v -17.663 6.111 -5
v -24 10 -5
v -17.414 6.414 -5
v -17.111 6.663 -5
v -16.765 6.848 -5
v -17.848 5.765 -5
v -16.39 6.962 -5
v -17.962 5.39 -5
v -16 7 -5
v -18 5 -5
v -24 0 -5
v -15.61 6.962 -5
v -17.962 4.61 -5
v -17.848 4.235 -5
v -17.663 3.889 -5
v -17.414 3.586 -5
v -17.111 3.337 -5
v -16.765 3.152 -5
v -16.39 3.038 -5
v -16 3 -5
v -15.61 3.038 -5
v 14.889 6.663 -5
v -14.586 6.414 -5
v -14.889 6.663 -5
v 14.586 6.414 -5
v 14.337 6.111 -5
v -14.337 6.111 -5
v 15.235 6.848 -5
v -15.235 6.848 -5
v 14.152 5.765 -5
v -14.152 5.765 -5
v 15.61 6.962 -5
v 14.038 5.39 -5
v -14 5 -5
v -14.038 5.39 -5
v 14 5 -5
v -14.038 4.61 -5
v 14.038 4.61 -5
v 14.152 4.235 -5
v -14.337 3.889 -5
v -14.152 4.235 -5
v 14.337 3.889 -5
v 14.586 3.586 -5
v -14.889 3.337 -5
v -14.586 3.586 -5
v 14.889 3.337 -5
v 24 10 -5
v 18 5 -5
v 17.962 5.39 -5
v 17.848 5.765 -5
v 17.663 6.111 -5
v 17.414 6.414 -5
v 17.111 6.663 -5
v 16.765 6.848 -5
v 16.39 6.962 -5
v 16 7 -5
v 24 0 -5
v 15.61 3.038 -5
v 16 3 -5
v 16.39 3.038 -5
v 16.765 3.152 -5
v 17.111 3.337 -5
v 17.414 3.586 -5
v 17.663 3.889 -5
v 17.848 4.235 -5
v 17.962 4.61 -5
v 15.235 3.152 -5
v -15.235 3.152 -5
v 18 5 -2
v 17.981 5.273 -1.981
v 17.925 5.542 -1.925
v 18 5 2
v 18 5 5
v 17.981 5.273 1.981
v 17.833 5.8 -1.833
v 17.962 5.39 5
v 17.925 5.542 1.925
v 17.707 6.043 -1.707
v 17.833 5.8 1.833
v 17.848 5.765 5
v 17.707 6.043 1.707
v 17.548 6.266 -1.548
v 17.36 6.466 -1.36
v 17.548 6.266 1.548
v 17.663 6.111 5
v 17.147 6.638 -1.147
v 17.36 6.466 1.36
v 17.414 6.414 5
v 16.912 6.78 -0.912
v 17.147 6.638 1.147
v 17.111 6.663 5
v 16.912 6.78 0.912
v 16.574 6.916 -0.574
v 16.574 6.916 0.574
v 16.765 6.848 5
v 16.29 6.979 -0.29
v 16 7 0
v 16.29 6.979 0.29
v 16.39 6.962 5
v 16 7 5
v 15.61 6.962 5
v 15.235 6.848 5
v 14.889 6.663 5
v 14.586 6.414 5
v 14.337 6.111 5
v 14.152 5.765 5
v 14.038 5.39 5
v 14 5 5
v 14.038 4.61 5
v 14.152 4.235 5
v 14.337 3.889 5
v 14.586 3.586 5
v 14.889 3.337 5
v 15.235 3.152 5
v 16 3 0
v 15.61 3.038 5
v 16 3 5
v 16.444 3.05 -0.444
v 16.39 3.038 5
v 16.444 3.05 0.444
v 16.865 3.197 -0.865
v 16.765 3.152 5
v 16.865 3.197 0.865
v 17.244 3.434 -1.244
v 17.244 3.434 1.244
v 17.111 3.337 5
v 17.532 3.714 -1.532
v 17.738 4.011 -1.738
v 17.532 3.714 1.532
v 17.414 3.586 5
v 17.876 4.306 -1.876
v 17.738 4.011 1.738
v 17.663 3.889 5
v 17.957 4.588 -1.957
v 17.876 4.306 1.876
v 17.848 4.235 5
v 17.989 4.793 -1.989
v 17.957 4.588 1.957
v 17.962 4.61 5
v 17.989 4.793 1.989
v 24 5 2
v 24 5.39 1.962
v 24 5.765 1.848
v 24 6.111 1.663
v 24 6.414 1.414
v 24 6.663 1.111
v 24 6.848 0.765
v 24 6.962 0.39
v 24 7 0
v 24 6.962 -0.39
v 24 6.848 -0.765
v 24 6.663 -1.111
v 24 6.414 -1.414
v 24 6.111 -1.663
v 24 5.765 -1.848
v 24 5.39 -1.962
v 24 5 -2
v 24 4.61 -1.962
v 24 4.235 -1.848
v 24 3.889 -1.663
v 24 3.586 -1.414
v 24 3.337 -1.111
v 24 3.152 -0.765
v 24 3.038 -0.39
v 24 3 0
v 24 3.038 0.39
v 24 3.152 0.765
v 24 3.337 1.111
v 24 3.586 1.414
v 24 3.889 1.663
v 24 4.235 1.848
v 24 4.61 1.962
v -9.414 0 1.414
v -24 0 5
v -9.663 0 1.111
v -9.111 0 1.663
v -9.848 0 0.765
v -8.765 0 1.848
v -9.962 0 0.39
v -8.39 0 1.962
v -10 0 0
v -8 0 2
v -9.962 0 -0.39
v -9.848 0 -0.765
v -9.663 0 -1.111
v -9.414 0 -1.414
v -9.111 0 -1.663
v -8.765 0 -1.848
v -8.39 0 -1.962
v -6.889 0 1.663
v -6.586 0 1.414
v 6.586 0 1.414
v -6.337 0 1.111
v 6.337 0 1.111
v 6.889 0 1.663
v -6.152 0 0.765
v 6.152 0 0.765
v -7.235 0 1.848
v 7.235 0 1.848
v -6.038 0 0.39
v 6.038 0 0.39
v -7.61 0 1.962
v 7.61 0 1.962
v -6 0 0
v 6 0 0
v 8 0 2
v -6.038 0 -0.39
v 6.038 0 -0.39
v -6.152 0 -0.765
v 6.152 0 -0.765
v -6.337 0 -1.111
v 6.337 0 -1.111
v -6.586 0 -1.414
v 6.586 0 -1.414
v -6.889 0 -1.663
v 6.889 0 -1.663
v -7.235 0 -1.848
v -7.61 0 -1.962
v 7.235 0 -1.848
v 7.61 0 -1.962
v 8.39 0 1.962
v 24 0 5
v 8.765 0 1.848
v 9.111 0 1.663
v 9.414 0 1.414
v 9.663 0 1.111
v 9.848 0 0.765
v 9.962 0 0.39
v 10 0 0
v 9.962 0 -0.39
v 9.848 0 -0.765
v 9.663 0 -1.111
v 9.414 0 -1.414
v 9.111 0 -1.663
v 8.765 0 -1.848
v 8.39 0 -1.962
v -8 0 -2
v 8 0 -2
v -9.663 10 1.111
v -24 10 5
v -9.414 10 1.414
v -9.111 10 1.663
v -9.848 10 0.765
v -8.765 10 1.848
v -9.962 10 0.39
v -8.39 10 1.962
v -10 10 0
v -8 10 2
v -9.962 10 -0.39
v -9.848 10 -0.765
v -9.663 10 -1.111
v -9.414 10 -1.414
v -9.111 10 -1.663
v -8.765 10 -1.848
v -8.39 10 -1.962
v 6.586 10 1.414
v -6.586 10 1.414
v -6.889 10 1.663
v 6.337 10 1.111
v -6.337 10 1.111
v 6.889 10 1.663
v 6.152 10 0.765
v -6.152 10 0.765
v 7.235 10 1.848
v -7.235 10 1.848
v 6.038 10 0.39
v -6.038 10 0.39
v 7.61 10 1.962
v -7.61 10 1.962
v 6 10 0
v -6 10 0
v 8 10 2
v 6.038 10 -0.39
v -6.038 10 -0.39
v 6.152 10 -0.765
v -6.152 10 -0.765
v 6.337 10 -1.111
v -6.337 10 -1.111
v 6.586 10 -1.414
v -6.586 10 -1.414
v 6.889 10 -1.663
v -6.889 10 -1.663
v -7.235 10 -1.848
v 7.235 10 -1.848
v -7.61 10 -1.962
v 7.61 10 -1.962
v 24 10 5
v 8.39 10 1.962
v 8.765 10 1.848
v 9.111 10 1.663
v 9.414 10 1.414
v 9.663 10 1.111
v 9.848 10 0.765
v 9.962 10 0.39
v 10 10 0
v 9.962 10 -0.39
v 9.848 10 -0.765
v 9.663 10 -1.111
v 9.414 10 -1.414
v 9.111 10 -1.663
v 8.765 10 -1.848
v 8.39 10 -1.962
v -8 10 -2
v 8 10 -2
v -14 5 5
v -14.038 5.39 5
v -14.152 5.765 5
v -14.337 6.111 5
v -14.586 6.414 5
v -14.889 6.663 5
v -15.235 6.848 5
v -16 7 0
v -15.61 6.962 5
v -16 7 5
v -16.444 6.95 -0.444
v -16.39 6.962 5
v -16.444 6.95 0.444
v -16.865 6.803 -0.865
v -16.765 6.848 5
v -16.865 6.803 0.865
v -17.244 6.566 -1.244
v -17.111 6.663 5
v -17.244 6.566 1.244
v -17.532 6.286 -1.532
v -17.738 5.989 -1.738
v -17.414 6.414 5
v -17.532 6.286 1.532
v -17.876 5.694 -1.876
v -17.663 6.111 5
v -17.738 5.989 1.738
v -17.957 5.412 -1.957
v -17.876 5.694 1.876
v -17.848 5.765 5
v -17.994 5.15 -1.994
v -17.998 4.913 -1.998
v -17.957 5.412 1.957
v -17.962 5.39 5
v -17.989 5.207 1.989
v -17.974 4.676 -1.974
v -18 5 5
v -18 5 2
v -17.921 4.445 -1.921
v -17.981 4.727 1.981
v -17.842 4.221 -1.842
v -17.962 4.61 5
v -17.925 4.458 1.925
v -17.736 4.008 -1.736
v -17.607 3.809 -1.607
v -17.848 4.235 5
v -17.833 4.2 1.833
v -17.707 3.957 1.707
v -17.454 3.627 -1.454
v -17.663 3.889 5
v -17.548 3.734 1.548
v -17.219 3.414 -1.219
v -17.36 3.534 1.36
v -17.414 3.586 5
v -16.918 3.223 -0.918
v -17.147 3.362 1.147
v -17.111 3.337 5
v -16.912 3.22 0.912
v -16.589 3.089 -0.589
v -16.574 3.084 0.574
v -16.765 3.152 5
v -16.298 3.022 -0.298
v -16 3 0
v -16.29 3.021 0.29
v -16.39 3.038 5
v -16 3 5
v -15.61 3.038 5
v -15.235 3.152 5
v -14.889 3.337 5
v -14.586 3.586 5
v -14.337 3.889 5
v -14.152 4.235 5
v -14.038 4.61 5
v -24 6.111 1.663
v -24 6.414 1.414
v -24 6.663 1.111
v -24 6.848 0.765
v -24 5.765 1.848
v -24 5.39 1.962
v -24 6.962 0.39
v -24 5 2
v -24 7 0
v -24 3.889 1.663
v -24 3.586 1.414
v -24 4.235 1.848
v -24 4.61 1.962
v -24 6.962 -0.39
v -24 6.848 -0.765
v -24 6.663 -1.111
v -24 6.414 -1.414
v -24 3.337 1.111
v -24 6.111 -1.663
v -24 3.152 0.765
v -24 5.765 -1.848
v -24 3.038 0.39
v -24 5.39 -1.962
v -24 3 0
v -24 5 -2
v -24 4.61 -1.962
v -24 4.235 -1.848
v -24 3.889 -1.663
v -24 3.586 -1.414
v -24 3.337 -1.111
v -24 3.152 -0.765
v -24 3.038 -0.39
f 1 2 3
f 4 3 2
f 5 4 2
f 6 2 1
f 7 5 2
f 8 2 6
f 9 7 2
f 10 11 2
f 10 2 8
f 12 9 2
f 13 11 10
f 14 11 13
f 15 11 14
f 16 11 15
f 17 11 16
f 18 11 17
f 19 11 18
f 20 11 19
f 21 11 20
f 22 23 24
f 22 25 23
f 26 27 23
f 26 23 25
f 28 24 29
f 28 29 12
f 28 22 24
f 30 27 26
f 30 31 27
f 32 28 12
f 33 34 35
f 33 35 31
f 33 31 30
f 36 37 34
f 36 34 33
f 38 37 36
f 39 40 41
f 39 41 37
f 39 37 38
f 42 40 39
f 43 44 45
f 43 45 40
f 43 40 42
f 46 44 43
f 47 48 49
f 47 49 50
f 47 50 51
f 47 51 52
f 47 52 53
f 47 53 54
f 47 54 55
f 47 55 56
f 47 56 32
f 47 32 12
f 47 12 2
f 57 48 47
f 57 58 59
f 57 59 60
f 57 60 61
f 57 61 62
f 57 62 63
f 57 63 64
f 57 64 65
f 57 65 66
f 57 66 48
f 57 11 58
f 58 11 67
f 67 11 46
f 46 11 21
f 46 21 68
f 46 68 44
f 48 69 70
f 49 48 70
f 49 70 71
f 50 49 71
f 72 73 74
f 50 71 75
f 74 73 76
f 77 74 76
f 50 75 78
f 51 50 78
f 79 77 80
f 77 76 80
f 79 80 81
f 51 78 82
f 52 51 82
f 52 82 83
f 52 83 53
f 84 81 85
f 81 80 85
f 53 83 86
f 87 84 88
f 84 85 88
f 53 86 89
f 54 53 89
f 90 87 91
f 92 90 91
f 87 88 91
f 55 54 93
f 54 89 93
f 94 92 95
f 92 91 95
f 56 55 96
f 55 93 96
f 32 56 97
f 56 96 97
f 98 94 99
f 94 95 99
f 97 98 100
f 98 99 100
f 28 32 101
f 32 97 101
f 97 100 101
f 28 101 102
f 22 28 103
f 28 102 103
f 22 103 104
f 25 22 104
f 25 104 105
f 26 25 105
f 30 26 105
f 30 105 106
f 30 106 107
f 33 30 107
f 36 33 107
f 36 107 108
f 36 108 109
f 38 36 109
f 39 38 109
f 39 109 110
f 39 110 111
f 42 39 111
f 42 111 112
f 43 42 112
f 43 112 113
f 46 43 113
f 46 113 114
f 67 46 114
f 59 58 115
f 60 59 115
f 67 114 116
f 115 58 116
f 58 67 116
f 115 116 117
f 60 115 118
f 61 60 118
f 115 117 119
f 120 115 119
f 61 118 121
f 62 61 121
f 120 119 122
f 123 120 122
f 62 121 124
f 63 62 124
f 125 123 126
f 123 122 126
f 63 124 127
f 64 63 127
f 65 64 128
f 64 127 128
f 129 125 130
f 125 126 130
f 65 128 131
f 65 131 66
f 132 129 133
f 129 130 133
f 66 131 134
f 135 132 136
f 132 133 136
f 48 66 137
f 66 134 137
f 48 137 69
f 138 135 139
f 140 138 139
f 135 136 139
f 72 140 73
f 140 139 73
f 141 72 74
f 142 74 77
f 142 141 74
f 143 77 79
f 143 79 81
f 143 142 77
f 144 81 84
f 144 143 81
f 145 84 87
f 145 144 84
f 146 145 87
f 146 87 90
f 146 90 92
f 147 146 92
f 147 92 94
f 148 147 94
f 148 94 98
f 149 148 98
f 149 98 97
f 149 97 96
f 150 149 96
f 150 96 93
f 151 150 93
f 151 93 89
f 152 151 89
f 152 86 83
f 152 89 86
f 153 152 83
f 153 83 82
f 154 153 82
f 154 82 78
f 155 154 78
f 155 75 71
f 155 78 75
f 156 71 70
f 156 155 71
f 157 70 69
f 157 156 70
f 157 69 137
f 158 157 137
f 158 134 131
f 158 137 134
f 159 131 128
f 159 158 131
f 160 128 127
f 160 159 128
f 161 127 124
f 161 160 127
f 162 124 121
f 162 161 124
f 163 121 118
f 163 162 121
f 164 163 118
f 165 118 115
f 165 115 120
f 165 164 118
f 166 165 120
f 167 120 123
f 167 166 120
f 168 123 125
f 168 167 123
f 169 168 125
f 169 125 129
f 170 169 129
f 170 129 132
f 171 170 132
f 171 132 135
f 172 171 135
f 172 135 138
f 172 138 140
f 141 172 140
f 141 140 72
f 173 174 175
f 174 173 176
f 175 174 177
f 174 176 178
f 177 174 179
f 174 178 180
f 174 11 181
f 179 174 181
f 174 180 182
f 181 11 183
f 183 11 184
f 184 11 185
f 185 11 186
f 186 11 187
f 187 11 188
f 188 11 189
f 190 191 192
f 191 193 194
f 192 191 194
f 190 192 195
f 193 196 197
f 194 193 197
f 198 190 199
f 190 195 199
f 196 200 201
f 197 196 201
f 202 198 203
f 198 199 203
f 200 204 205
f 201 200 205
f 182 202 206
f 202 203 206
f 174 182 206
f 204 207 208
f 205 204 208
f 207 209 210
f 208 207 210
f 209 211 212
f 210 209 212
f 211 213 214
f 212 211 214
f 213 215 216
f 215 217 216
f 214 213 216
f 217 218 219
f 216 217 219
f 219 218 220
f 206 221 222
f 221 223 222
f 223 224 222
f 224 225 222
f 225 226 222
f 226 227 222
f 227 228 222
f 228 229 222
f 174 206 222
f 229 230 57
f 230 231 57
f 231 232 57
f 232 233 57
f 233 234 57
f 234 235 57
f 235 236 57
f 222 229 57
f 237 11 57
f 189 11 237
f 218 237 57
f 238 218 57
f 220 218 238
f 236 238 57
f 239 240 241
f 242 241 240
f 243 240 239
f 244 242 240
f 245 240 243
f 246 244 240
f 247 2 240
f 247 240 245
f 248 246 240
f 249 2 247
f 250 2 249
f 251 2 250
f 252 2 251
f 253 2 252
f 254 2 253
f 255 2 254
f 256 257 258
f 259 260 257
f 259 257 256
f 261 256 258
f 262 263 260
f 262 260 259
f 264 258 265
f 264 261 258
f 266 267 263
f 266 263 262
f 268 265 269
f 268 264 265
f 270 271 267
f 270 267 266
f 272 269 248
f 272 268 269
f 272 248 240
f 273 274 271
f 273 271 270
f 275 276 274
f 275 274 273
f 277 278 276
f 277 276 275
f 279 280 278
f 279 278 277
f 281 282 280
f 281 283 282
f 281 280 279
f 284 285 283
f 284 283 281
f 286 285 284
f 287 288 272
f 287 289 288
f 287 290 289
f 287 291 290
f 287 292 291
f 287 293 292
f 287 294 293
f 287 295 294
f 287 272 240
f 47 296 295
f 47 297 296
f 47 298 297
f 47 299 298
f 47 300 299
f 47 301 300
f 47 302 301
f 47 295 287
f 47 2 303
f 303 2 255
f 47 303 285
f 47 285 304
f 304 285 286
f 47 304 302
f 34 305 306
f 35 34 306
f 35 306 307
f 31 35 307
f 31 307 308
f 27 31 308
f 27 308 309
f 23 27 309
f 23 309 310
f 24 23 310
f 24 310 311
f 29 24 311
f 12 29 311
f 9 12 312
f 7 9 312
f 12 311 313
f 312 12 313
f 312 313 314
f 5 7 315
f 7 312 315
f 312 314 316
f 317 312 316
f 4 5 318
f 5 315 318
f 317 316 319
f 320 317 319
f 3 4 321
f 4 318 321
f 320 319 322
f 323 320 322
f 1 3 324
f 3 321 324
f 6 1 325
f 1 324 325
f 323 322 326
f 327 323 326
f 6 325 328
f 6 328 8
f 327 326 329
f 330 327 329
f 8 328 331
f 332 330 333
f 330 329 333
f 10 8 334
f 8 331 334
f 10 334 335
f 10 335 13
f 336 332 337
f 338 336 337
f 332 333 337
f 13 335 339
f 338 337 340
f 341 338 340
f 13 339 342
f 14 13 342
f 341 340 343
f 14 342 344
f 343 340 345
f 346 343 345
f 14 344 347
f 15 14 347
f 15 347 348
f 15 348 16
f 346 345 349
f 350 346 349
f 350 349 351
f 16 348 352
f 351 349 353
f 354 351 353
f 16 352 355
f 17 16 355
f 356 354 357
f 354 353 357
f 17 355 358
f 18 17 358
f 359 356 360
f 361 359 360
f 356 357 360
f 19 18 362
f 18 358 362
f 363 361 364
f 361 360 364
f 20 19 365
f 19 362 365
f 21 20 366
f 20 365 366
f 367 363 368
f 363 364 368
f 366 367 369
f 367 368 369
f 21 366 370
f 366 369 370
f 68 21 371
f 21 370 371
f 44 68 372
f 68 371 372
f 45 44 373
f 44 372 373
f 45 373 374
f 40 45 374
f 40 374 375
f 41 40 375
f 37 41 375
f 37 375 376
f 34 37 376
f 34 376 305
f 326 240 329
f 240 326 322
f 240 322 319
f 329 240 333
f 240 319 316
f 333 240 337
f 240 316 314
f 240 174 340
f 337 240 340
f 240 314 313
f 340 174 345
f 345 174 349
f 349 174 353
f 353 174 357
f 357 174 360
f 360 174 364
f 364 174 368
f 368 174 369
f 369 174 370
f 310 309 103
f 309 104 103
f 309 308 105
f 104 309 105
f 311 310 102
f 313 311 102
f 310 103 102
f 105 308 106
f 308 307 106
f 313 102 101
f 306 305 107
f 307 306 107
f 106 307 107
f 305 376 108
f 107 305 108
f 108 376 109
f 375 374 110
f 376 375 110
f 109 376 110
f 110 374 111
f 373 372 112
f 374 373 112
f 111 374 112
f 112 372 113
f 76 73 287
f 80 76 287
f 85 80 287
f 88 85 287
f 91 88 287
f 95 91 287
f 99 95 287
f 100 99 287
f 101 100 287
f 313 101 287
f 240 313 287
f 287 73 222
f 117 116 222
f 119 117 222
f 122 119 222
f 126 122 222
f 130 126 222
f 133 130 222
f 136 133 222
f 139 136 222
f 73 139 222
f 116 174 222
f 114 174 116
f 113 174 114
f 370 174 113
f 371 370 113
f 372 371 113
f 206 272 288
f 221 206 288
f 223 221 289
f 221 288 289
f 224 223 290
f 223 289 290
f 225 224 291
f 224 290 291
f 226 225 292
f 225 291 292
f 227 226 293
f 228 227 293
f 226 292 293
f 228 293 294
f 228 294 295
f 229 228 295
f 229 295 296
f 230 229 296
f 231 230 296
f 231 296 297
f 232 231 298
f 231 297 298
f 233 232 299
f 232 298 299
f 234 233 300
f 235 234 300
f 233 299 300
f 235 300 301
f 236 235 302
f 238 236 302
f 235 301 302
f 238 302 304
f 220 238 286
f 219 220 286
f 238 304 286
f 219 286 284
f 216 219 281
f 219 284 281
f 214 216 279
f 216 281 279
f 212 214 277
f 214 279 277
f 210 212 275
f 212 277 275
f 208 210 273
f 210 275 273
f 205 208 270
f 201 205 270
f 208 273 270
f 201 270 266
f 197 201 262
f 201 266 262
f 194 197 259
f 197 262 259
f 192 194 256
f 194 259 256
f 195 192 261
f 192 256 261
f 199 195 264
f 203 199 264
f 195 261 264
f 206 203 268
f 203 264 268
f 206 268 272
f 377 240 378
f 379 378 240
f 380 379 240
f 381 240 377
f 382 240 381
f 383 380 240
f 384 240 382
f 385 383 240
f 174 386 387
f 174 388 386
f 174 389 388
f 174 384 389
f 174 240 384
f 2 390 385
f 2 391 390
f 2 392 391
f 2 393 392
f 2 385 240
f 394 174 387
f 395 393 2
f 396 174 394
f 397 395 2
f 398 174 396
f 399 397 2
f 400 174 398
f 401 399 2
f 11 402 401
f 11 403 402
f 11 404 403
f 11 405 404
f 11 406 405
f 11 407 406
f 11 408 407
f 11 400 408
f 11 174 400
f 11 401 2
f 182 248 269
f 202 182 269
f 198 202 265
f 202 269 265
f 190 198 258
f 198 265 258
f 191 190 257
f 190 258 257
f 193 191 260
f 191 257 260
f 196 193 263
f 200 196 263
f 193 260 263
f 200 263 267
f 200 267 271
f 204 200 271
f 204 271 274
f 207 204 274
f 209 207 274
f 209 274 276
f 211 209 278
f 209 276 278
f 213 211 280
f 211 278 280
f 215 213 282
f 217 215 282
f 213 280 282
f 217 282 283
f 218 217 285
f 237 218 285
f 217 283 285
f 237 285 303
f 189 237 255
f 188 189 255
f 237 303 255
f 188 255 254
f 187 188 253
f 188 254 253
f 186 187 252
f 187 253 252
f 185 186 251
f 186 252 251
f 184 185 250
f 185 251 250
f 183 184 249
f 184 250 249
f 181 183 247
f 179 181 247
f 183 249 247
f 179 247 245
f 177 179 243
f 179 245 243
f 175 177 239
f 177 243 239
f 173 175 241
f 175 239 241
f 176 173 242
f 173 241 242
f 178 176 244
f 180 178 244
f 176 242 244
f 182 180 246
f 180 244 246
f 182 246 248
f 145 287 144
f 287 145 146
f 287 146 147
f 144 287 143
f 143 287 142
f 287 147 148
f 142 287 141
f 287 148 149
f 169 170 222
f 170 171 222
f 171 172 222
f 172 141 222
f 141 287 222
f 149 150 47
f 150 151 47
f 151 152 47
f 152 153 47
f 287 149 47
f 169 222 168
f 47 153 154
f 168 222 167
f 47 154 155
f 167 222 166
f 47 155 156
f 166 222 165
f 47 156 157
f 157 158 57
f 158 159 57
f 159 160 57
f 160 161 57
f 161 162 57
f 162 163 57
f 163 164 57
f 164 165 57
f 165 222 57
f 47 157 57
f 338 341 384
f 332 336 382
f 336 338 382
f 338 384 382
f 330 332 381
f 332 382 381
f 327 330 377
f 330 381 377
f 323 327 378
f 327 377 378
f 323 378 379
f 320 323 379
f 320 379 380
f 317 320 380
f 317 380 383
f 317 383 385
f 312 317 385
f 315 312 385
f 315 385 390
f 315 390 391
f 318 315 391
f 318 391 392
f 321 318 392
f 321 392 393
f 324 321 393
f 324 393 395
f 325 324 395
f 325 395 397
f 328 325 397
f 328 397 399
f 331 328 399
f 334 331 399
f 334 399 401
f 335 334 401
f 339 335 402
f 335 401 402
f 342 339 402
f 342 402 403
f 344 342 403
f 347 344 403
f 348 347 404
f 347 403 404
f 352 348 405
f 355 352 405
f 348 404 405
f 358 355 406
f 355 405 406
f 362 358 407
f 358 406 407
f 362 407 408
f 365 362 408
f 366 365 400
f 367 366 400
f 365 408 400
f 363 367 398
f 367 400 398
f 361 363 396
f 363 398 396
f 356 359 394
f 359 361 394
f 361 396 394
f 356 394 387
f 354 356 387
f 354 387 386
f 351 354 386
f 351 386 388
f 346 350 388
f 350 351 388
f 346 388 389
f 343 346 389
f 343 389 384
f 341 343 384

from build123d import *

# Parameters (mm, degrees)
SKETCH_1_W          = 48
SKETCH_1_H          = 10
EXTRUDE_1_DEPTH     = 10
SKETCH_2_R          = 2
CUT_EXTRUDE_1_DEPTH = 10
SKETCH_3_R          = 2
CUT_EXTRUDE_2_DEPTH = 10
SKETCH_4_R          = 2
CUT_EXTRUDE_3_DEPTH = 8


with BuildPart() as part:
    # 草图1 → 凸台-拉伸1 (new body)
    with BuildSketch(Plane(origin=(0, 0, 0), x_dir=(1, 0, 0), z_dir=(0, 1, 0))):
        Rectangle(SKETCH_1_W, SKETCH_1_H)
    extrude(amount=EXTRUDE_1_DEPTH)

    # 草图2 → 切除-拉伸1 (cut)
    with BuildSketch(Plane.XY.offset(5)):
        with Locations((-16, 5)):
            Circle(SKETCH_2_R)
        with Locations((16, 5)):
            Circle(SKETCH_2_R)
    extrude(amount=-CUT_EXTRUDE_1_DEPTH, mode=Mode.SUBTRACT)

    # 草图3 → 切除-拉伸2 (cut)
    with BuildSketch(Plane(origin=(0, 10, 0), x_dir=(1, 0, 0), z_dir=(0, 1, 0))):
        with Locations(Location((-8, 0, 0), (0, 0, 270))):
            Circle(SKETCH_3_R)
        with Locations(Location((8, 0, 0), (0, 0, 270))):
            Circle(SKETCH_3_R)
    extrude(amount=-CUT_EXTRUDE_2_DEPTH, mode=Mode.SUBTRACT)

    # 草图4 → 切除-拉伸3 (cut)
    with BuildSketch(Plane.ZY.offset(24)):
        with Locations((0, 5)):
            Circle(SKETCH_4_R)
    cut_extrude_3 = extrude(amount=-CUT_EXTRUDE_3_DEPTH, mode=Mode.SUBTRACT)

    # 镜向1: 切除-拉伸3 across plane
    add(cut_extrude_3.mirror(Plane(origin=(0, 0, 0), x_dir=(0, 0, 1), z_dir=(1, 0, 0))), mode=Mode.SUBTRACT)


solid = part.part
